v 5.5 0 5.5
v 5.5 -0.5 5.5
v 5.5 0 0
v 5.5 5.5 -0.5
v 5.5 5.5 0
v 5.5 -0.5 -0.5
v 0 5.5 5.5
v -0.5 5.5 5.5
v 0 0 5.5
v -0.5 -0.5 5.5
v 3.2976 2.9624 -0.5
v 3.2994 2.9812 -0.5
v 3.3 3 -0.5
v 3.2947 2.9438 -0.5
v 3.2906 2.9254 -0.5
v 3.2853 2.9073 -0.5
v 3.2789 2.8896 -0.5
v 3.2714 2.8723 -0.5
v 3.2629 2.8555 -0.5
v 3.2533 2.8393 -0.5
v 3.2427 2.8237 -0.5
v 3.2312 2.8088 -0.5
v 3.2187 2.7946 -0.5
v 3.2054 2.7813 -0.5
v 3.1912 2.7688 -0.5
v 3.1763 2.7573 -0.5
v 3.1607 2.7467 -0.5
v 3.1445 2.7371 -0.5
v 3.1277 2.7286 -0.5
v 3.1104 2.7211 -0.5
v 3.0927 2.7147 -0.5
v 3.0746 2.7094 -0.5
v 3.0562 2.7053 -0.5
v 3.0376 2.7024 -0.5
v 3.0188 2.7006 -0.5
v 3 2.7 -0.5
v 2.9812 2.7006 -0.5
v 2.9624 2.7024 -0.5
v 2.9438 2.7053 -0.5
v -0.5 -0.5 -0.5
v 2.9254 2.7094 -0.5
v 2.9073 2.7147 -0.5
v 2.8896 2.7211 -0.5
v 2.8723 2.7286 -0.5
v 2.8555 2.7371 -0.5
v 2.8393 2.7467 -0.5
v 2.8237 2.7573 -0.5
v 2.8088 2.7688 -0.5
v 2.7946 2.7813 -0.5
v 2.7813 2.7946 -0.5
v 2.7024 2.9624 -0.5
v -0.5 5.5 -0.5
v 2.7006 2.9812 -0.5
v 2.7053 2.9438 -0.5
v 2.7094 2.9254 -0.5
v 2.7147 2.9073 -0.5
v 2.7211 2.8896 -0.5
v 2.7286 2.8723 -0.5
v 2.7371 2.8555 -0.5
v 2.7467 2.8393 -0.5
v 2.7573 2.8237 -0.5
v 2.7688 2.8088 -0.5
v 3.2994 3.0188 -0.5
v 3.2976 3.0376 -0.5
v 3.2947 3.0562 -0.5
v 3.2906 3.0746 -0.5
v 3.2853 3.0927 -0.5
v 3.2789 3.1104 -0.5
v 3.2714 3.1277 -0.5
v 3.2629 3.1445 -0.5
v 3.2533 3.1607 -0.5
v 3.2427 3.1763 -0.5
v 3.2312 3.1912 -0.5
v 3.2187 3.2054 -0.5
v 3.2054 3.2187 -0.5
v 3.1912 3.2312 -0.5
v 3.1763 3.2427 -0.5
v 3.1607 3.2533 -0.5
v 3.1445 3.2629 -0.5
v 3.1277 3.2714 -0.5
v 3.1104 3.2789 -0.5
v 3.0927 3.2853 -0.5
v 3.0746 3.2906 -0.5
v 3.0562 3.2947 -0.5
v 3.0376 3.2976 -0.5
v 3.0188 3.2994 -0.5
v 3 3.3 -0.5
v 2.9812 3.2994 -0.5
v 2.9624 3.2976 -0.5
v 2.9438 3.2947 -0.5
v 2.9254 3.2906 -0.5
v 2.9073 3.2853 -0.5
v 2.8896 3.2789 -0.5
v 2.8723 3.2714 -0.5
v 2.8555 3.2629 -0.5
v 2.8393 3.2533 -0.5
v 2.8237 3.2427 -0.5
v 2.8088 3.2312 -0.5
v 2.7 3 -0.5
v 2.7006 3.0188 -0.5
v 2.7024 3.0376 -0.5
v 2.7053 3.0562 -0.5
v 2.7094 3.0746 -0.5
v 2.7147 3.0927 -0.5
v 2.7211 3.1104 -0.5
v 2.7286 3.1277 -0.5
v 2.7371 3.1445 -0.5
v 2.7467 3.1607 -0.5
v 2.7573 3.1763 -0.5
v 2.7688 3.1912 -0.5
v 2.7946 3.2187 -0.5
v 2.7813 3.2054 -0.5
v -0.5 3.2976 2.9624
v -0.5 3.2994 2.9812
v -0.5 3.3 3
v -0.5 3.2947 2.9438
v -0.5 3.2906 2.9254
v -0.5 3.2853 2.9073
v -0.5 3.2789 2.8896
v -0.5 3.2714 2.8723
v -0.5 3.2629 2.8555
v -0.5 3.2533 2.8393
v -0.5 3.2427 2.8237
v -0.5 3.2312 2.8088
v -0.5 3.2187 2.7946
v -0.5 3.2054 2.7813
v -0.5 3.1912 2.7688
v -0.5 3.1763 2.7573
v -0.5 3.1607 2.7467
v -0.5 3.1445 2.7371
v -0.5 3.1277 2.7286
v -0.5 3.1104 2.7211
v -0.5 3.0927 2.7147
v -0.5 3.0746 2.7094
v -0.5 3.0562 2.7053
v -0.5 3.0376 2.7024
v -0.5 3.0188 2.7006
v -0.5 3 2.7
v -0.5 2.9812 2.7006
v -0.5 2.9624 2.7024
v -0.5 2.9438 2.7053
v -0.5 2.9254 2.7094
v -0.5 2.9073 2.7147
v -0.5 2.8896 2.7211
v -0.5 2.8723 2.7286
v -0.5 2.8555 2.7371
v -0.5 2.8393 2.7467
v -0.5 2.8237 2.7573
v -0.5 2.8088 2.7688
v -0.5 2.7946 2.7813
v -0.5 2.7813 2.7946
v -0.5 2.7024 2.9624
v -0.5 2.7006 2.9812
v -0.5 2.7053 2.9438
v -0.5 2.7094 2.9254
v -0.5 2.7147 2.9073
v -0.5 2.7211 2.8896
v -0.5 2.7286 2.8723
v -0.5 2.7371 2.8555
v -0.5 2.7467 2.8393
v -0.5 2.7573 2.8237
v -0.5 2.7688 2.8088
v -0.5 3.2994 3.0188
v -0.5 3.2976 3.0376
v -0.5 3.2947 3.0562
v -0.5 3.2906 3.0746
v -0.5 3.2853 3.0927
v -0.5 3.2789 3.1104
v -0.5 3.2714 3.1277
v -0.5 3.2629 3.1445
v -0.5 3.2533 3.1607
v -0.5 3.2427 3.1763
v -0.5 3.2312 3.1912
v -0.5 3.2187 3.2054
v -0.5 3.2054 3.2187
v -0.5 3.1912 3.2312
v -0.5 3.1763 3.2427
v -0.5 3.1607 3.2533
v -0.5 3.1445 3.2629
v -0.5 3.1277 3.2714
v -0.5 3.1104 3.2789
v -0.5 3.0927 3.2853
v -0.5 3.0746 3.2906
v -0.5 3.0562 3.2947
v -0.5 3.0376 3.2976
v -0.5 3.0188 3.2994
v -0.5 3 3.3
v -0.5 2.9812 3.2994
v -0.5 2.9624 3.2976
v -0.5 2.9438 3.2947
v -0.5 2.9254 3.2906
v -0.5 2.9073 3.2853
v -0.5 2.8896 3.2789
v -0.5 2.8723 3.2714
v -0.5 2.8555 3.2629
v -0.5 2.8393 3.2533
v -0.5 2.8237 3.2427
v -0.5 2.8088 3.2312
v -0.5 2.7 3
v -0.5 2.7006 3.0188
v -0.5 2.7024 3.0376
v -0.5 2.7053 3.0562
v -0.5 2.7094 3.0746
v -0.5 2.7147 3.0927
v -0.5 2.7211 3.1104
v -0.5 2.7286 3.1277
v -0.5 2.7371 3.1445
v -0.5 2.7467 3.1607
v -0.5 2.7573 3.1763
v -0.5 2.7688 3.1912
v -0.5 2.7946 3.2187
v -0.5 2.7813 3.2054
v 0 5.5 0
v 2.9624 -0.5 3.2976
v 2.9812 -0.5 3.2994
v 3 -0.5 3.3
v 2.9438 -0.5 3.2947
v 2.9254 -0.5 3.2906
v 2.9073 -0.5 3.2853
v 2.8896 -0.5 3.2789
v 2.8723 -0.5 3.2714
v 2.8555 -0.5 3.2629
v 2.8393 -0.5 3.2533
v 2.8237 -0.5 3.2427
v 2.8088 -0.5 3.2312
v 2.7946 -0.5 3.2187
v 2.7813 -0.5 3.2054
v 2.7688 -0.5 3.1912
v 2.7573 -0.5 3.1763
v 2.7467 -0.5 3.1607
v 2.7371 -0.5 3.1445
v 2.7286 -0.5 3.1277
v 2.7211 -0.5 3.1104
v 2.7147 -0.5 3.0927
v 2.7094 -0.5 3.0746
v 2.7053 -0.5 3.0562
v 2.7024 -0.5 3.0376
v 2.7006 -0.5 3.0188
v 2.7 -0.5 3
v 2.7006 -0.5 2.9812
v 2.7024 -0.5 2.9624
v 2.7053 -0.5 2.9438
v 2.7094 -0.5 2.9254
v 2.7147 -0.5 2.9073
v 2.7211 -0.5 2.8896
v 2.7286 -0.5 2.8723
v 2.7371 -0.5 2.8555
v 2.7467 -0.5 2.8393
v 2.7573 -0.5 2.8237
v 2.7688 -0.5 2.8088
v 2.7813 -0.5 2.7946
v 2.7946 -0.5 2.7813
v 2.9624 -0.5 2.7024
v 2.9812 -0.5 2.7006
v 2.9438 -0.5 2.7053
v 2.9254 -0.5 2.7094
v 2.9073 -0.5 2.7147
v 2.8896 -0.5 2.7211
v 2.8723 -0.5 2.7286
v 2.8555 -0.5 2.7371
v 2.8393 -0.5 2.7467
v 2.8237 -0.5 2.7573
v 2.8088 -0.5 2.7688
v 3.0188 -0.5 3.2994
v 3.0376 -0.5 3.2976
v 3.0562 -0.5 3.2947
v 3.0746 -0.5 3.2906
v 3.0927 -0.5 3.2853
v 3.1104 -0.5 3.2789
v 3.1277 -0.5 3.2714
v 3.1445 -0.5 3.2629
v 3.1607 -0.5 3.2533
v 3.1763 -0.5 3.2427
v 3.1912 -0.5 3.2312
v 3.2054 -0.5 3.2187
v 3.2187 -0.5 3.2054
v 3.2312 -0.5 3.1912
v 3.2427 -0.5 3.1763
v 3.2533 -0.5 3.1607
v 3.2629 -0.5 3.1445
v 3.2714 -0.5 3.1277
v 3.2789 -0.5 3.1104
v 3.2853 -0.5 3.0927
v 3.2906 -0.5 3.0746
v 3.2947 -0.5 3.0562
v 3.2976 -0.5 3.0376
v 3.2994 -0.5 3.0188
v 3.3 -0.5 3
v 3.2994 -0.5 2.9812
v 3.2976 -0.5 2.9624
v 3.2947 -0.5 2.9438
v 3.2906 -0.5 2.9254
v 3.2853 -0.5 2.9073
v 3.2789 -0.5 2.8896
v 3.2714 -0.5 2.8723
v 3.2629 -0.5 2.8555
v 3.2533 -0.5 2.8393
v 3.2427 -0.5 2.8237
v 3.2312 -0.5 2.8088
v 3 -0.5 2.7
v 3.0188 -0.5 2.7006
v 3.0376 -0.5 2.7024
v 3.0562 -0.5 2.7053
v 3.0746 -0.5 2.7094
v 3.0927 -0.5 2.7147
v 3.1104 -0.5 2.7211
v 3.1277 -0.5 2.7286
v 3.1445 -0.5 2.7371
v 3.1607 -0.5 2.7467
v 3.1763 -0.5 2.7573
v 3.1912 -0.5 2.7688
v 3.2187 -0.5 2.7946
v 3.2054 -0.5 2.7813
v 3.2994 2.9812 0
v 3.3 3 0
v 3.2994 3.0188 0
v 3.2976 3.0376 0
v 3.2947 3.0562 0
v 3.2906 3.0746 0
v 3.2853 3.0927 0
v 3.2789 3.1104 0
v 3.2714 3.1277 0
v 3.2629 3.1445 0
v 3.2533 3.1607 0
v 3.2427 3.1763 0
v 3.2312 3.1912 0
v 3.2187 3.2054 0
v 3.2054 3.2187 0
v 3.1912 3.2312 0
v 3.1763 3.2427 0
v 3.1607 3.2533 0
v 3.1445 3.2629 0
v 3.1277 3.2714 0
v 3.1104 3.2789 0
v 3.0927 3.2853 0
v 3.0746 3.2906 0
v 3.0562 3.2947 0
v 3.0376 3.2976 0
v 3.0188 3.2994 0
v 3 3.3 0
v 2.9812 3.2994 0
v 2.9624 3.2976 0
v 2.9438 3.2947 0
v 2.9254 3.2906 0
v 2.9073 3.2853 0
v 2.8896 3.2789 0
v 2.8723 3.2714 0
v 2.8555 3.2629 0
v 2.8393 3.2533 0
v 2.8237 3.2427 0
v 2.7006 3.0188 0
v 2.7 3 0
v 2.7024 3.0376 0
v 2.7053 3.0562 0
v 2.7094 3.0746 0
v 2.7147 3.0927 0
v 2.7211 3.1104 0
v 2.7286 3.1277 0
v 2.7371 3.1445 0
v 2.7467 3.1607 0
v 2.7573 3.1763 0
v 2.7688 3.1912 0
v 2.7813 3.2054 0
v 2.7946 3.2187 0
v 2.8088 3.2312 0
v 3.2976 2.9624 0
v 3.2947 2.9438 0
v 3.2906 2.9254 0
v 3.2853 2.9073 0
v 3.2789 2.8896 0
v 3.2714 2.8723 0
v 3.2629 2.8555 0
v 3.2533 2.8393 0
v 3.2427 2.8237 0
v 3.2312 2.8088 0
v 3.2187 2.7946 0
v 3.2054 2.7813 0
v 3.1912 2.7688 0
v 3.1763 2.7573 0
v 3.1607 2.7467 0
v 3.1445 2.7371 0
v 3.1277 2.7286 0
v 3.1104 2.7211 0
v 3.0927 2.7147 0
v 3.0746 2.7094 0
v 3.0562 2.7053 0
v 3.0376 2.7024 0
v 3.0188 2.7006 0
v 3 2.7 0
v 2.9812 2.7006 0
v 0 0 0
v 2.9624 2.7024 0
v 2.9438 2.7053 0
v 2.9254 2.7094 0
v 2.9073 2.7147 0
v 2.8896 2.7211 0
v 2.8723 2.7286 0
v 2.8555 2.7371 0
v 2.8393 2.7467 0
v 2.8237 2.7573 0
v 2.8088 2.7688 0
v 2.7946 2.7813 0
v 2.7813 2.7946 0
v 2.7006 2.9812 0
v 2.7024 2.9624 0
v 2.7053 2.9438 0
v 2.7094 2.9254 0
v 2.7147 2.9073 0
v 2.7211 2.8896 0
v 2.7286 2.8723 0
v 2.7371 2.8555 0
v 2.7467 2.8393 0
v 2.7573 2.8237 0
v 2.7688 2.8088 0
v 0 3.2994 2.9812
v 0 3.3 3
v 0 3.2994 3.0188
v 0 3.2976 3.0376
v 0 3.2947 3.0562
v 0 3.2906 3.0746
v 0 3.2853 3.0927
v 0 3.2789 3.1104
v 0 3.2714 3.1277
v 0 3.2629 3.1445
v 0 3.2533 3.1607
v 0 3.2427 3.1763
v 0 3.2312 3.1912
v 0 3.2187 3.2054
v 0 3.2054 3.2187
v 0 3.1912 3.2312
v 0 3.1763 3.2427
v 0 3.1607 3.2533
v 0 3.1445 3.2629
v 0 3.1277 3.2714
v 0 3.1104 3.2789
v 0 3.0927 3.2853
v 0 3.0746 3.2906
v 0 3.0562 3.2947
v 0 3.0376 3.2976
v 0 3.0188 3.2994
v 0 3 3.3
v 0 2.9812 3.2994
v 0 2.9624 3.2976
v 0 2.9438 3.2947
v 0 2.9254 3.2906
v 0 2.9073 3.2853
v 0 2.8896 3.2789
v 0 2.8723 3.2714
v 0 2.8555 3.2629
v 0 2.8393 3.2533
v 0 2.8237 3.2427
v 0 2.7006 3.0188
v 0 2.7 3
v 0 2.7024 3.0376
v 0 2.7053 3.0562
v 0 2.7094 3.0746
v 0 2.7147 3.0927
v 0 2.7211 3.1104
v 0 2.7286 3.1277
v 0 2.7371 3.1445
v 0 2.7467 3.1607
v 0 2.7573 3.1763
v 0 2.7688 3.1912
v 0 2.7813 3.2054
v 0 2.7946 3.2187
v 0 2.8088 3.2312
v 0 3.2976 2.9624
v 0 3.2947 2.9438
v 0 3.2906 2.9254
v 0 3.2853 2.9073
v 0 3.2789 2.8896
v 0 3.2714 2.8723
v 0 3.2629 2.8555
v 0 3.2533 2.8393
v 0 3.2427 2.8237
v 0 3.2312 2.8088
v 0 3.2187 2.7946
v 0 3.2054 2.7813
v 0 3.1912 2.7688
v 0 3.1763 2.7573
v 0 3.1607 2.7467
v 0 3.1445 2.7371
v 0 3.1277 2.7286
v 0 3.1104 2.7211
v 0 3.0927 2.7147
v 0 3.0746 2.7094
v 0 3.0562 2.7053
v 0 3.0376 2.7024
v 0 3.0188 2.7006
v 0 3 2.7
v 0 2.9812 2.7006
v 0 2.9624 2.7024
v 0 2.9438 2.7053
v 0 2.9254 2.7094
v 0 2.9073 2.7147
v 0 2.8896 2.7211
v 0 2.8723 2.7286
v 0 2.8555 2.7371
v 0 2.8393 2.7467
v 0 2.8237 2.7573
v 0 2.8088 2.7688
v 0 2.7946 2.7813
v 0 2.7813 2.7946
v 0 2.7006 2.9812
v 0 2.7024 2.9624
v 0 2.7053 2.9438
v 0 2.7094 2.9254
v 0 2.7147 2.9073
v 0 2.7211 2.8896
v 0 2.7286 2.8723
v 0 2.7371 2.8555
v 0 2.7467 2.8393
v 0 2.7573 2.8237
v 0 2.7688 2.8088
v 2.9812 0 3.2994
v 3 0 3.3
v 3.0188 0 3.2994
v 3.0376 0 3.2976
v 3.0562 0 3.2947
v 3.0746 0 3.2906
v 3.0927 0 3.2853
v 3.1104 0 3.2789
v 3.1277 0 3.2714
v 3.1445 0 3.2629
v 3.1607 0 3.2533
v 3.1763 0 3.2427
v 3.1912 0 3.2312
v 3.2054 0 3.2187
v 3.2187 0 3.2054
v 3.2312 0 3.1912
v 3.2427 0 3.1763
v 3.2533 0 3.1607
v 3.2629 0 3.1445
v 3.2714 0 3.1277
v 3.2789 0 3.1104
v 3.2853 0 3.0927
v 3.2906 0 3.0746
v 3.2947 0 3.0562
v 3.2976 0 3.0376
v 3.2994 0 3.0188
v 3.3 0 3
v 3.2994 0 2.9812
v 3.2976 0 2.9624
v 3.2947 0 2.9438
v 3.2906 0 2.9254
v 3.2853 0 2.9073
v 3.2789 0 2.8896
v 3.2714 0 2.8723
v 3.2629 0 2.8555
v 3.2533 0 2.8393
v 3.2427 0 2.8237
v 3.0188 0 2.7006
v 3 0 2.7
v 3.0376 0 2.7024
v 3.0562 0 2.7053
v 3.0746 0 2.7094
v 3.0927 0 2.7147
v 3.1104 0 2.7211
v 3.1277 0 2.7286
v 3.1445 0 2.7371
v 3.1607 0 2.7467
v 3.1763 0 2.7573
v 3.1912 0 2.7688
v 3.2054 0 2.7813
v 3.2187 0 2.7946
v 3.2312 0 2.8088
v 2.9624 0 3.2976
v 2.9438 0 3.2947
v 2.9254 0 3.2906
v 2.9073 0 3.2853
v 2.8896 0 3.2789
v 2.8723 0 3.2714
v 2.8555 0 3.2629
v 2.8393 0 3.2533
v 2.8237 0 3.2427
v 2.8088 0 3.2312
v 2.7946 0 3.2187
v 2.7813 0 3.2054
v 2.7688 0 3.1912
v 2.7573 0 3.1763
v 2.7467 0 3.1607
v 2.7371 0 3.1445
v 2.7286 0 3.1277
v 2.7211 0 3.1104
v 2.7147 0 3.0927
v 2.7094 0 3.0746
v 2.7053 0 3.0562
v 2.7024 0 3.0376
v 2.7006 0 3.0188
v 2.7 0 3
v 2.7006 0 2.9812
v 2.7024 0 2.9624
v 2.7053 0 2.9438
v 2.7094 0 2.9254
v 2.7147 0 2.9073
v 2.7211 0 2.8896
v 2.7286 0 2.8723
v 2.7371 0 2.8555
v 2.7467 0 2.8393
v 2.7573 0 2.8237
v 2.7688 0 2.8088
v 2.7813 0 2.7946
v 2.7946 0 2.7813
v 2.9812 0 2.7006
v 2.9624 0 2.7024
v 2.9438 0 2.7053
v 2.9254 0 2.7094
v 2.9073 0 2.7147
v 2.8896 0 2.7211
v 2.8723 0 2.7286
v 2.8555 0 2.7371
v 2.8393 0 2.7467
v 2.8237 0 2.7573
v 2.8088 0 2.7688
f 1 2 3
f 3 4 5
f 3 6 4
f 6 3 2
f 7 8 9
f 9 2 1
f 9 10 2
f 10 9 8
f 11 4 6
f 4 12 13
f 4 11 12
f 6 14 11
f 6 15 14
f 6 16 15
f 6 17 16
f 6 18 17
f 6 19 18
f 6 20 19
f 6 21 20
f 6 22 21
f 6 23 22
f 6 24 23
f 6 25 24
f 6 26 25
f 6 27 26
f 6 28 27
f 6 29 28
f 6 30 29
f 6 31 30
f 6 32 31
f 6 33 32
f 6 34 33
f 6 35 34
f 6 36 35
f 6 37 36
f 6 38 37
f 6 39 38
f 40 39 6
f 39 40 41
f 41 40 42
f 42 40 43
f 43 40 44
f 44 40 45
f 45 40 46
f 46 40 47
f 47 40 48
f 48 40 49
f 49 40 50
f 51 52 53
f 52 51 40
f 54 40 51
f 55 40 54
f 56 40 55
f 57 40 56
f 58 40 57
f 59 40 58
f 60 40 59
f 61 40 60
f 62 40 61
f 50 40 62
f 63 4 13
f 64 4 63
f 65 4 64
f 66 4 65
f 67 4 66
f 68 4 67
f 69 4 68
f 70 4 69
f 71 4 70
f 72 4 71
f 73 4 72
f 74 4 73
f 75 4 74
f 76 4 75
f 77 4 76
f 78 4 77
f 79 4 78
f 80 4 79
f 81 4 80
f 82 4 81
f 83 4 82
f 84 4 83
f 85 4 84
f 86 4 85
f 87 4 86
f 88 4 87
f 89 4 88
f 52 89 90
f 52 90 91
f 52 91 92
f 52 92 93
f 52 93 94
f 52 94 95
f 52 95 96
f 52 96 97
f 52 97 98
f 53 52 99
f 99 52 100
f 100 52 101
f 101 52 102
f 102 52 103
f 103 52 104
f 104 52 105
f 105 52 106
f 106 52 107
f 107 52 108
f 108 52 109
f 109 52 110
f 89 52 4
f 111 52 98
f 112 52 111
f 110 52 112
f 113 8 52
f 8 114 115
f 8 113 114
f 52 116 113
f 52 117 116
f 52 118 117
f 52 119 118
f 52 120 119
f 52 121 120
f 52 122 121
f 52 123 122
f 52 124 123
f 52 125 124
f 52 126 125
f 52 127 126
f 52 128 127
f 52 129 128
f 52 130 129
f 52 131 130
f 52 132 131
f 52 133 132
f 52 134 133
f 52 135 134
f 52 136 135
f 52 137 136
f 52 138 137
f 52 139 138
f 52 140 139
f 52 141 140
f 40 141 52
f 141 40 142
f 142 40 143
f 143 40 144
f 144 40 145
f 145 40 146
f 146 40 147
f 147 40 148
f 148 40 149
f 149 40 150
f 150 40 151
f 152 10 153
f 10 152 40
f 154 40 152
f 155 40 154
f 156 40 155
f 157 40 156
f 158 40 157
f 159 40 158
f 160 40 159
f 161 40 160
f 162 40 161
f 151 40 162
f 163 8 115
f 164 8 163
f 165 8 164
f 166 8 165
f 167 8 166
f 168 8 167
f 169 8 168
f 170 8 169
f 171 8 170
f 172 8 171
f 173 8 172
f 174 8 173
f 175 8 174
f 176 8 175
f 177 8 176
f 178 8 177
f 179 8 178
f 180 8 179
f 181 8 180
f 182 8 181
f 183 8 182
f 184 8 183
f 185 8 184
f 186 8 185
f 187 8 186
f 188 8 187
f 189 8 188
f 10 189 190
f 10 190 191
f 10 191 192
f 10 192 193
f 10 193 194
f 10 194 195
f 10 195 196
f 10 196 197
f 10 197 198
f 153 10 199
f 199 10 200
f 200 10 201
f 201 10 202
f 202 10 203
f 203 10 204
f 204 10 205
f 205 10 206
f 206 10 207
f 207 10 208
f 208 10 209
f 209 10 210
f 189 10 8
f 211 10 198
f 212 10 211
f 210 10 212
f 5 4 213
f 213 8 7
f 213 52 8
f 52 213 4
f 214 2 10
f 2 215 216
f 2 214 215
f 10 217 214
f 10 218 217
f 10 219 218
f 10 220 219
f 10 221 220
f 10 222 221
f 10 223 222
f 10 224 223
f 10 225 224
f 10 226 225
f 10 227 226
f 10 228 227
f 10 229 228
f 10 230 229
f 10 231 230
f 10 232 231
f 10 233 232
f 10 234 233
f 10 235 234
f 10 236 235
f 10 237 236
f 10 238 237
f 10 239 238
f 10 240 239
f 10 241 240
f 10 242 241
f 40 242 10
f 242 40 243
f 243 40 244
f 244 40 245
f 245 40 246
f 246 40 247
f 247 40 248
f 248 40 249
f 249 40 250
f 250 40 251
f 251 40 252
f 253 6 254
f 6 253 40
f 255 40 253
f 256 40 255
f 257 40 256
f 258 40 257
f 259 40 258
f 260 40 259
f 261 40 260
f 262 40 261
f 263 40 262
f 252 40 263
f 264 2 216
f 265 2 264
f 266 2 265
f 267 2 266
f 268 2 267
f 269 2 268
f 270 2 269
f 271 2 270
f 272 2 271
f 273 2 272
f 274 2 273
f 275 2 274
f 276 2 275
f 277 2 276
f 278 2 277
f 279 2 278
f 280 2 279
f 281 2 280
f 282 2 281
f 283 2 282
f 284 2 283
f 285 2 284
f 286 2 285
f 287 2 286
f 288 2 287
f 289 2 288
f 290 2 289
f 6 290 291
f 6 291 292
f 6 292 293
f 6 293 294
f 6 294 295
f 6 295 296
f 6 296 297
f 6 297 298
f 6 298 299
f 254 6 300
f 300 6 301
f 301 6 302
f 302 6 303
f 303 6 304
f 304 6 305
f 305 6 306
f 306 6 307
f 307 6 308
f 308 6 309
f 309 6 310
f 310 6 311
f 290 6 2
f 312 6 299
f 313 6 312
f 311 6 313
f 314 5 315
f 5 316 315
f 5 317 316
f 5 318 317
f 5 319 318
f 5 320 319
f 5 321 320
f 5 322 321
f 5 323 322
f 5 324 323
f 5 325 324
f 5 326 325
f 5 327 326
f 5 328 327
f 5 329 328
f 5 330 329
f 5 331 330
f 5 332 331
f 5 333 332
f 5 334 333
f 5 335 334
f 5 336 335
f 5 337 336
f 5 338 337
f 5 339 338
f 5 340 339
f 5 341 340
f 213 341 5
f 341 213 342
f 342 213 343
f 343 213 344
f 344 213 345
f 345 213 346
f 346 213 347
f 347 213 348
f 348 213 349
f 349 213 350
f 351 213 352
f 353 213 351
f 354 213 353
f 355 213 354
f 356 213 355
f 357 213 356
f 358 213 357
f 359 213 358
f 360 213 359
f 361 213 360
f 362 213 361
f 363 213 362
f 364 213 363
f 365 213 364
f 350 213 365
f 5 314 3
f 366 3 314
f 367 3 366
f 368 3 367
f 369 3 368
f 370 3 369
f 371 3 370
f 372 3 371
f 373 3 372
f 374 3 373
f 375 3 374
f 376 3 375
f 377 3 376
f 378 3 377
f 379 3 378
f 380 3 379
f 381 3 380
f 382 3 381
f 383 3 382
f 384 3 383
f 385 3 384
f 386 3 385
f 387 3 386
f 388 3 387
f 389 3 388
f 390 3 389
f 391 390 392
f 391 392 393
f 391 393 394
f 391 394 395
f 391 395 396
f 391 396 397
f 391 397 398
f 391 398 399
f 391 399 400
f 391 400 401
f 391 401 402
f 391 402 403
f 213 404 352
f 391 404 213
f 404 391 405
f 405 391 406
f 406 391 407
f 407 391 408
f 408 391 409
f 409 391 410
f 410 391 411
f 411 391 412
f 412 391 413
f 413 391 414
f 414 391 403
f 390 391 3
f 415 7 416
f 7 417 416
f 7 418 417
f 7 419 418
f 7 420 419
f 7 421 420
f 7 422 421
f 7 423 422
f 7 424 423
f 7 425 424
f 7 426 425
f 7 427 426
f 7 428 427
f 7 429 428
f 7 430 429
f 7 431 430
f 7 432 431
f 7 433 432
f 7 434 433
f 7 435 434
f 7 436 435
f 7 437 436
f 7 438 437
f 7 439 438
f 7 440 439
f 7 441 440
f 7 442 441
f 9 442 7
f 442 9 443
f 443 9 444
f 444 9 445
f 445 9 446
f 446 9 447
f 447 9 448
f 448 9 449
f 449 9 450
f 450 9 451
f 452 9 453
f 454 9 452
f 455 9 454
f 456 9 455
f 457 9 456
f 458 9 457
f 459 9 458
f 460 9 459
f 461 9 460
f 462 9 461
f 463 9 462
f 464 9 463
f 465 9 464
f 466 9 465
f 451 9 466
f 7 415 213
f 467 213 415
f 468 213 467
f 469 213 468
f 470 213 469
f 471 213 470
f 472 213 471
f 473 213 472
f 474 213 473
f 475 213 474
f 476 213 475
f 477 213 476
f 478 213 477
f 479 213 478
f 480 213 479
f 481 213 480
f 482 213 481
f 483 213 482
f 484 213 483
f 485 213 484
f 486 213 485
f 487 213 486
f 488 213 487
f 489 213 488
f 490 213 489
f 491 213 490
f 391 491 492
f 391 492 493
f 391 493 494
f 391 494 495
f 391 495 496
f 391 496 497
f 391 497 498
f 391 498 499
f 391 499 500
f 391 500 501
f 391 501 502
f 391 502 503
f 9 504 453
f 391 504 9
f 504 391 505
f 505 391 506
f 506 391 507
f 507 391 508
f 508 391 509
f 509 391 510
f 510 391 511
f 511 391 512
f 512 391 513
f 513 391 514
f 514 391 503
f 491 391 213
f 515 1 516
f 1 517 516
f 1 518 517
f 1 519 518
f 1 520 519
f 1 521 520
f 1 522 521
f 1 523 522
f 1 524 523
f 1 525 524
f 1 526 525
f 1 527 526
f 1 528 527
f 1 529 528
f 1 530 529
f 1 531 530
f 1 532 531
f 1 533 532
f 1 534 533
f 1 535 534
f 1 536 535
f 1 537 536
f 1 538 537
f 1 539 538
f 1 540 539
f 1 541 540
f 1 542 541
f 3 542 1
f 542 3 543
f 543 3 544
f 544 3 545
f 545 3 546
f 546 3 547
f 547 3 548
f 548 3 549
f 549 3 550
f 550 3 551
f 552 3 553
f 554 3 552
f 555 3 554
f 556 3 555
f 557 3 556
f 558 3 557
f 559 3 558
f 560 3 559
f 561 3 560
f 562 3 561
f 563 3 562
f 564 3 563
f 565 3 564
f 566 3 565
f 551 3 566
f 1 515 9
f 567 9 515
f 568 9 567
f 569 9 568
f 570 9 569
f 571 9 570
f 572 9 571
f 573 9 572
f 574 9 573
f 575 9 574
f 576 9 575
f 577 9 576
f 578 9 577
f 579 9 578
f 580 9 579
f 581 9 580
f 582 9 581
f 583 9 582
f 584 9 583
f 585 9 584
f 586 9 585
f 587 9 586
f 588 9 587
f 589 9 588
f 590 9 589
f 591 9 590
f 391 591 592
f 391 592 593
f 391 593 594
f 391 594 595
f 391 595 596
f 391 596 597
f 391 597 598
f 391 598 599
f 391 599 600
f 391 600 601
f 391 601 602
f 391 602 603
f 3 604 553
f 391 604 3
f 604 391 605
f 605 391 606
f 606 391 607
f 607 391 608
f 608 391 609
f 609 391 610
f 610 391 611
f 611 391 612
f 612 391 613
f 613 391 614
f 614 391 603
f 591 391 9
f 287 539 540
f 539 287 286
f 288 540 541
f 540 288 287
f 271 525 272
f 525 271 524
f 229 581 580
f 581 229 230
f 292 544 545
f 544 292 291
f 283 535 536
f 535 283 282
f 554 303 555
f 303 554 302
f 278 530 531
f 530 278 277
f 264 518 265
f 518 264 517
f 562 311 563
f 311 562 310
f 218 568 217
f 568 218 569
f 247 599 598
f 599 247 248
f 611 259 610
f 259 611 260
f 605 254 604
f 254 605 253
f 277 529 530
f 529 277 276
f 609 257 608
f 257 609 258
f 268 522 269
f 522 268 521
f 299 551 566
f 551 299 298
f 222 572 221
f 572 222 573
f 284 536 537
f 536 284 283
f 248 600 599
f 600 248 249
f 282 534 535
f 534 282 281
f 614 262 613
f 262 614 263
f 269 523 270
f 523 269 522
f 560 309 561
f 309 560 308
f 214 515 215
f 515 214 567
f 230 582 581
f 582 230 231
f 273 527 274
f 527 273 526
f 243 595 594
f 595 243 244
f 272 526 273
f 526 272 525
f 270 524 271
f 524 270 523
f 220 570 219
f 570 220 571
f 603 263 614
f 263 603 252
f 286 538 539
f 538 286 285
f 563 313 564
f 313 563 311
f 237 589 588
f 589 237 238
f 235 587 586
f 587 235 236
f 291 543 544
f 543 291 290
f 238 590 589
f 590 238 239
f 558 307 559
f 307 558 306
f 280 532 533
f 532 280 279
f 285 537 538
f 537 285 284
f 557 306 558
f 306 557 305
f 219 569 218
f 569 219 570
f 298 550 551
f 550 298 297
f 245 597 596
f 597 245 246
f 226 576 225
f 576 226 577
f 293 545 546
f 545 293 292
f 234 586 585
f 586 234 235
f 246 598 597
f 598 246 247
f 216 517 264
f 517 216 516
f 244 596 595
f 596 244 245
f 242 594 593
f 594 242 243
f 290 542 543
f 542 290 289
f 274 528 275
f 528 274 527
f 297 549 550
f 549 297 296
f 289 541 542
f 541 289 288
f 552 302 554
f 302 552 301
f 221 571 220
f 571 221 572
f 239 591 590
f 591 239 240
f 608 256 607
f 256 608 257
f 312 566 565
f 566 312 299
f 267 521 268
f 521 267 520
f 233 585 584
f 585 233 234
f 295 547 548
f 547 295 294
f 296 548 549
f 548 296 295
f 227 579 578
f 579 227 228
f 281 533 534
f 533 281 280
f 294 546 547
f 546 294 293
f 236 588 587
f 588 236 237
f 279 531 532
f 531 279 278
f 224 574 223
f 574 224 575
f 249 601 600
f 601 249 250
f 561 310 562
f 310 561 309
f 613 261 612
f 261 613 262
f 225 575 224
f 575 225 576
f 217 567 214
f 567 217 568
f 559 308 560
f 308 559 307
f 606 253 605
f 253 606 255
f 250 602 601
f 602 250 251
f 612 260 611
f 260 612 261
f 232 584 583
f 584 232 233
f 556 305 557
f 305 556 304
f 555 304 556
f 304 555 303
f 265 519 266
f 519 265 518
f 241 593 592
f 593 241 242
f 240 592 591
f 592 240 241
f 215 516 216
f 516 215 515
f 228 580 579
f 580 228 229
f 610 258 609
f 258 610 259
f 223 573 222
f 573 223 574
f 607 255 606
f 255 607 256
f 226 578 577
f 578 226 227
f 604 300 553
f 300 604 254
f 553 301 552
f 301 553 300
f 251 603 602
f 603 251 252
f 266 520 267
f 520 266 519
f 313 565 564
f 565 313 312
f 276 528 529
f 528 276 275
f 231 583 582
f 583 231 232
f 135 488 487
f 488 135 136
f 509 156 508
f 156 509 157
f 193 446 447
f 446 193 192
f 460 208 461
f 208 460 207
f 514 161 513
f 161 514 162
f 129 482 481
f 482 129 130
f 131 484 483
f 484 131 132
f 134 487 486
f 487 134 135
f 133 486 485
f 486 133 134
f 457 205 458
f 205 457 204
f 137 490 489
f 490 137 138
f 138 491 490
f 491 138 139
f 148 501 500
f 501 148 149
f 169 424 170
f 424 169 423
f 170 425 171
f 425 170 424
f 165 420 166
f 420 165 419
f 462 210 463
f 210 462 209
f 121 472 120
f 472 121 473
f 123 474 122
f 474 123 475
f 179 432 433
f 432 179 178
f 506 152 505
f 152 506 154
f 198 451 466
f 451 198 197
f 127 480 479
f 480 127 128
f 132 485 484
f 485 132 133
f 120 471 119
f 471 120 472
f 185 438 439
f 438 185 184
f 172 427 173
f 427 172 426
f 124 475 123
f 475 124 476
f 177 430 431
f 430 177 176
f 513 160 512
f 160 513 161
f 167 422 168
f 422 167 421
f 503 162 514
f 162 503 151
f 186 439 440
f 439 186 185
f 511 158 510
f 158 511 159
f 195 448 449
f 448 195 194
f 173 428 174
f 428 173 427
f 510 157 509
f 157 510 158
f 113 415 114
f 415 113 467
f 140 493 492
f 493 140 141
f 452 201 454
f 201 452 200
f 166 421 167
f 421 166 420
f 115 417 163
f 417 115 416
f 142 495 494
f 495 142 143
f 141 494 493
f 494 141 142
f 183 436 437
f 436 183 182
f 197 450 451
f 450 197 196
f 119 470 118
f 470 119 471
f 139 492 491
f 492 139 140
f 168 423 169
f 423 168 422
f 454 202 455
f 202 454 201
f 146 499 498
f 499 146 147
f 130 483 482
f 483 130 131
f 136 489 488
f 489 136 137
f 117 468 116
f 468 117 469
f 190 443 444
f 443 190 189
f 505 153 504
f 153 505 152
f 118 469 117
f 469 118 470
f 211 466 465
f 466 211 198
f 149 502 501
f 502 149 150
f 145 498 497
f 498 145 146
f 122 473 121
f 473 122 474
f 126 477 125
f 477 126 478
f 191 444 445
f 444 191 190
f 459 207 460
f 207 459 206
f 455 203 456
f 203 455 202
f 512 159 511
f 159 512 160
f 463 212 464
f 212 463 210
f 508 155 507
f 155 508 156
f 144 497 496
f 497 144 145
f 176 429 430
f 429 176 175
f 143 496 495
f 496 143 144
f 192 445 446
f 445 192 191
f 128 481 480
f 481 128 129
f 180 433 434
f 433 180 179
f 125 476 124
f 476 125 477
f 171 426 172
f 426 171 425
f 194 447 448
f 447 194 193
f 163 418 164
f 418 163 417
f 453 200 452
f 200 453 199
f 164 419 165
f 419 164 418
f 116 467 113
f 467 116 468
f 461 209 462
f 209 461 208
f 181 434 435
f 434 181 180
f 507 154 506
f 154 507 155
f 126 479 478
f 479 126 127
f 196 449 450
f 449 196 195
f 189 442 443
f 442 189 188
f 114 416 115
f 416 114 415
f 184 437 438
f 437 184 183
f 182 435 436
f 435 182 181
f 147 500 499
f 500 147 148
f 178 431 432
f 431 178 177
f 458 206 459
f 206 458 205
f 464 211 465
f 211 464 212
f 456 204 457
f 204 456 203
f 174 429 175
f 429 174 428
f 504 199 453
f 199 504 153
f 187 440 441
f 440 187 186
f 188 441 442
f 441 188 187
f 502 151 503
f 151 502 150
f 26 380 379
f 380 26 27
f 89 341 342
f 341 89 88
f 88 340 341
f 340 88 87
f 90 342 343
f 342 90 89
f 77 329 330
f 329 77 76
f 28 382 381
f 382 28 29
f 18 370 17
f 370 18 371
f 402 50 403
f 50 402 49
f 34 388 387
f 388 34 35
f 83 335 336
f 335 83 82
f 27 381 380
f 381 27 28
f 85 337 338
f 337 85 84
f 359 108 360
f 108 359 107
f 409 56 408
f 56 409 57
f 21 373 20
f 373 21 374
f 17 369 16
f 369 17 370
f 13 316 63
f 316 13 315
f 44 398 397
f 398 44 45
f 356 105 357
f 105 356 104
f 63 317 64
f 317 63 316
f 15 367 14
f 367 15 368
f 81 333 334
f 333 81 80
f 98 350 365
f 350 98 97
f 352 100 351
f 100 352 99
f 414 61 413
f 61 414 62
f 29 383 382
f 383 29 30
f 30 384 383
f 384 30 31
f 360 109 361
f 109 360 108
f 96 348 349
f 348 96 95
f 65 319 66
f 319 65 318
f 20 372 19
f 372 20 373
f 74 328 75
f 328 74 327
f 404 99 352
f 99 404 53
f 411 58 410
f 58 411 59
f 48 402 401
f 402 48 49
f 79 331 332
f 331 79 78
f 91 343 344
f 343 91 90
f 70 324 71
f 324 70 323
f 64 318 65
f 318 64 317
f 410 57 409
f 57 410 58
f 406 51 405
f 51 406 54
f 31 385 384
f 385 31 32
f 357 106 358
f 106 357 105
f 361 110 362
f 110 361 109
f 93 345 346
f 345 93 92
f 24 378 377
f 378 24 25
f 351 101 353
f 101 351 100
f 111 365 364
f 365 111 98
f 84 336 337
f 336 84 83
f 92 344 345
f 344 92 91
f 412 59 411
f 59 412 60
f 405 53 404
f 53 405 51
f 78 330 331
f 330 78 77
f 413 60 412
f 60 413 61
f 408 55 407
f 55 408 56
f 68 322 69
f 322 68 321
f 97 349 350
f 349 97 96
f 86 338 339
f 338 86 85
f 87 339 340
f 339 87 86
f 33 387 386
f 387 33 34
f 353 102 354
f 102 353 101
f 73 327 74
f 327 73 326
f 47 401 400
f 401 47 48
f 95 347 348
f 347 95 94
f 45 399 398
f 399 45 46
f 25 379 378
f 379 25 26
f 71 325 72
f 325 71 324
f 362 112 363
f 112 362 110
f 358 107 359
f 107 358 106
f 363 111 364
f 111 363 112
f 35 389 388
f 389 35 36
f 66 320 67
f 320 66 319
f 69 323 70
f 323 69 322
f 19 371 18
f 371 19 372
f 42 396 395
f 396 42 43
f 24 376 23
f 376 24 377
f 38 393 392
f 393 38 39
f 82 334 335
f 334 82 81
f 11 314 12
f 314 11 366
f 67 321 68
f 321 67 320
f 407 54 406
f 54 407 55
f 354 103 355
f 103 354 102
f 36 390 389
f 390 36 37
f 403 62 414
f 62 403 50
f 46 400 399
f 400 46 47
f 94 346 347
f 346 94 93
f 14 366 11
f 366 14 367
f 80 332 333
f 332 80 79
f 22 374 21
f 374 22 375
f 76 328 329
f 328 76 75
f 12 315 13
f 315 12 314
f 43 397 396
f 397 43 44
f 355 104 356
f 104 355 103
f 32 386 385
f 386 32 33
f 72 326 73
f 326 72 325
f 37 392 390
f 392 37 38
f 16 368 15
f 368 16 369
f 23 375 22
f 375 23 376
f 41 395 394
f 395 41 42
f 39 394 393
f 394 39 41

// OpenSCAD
n = 6;
r = 0.3;
$fn = 100;
difference(){
	translate([-0.5,-0.5,-0.5]) cube(n);
	color("blue") cube(n);
	translate([n/2,n/3,n/2]) rotate([90,0,0]) cylinder(n/2, r, r);
	translate([-n/3,n/2,n/2]) rotate([0,90,0]) cylinder(n/2, r, r);
	translate([n/2,n/2,-n/3]) rotate([0,0,90]) cylinder(n/2, r, r);

}
